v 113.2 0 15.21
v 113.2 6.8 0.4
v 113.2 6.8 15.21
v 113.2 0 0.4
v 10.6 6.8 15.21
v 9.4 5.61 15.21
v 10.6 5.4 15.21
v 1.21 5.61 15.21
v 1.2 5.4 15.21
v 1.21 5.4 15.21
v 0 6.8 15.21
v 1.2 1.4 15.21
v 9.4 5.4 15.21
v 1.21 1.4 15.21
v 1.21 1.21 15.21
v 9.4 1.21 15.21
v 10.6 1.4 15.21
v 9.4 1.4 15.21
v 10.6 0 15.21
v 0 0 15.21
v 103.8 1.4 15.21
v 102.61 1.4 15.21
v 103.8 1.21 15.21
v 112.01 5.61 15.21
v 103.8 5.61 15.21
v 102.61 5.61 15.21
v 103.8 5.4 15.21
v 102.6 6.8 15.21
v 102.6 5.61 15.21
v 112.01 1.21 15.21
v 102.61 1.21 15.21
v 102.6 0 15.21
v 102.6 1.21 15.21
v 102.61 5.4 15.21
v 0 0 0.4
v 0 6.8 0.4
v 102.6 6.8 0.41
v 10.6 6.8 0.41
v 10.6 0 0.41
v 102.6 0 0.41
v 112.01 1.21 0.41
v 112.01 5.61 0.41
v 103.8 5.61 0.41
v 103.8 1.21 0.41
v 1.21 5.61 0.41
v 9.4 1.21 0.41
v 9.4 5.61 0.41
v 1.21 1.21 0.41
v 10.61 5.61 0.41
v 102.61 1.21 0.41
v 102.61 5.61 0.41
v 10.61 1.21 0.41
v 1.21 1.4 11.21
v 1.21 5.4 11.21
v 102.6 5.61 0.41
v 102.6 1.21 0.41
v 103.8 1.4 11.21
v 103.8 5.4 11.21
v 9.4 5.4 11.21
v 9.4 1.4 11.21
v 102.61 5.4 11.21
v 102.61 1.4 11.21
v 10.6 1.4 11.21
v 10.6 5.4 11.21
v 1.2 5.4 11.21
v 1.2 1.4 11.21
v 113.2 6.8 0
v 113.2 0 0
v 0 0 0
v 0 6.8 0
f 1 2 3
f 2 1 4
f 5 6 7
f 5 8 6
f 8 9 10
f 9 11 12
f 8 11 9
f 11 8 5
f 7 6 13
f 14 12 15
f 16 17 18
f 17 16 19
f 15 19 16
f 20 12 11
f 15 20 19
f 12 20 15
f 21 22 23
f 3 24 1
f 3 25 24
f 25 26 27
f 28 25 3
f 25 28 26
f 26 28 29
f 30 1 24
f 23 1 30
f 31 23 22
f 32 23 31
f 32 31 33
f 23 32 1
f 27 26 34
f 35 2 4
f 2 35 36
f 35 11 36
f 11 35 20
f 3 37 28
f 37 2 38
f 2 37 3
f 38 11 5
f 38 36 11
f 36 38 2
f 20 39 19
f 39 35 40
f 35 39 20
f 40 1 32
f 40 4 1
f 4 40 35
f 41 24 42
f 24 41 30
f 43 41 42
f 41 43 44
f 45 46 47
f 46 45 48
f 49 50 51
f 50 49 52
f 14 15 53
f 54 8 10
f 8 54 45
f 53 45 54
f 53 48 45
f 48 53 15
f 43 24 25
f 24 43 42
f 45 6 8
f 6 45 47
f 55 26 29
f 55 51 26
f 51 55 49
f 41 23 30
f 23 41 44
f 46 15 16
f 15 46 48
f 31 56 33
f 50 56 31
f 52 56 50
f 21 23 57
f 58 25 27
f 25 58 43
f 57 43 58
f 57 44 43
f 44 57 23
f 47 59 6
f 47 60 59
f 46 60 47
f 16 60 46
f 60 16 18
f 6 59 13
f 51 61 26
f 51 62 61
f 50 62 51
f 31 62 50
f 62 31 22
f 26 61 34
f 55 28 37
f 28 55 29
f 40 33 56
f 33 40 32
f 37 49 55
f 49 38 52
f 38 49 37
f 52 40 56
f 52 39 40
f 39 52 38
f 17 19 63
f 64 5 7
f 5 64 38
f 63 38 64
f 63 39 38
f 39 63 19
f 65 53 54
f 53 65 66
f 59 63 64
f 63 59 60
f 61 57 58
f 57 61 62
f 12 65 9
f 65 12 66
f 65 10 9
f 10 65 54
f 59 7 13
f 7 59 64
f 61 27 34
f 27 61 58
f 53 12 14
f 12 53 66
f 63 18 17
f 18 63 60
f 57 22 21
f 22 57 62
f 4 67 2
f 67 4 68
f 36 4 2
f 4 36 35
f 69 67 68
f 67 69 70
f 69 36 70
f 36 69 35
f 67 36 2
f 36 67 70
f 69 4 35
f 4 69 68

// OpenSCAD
// file: ../../Base/Rotation.scad
// Fischertechnik Box Foundation
// Geometry Helpers Rotation

include <PlacementOptions.scad>

// getRotatedSpace(space, rotation=NoRotation)
// Rotates the space dependent on the specified rotation

function getRotatedSpace(space, rotation=NoRotation) = [
    (rotation == Rotate90 || rotation == Rotate270) ? space.y : space.x,
    (rotation == Rotate90 || rotation == Rotate270) ? space.x : space.y
];

// Rotates the given space around the fixed left lower corner
// space = the space the children needs as width/depth list [width,depth]
// rotation = 0 Rotate0 degrees, 1 Rotate90 degrees, 2 Rotate180 degrees, 3 Rotate270 degrees (equivalent to -90)

module RotateFix(space, rotation=NoRotation) {
    dy = (rotation == Rotate0 || rotation == Rotate270) ? 0 :
        (rotation == Rotate90) ? space.x :
        space.y;
    dx = (rotation < Rotate180) ? 0 :
        (rotation == Rotate180) ? space.x :
        space.y;
    
    translate([dx, dy, 0])
        rotate([0, 0, rotations[rotation]])
            children();
}
// file: ../../Base/Alignment.scad
// Fischertechnik Box Foundation
// Geometry Helpers Alignment

include <PlacementOptions.scad>

// getAlignedX(elementWidth, spaceWidth, align=AlignRight, offset=0)
// Gets the aligned X offset of an element with the given
// width in the given space.
// elementWidth = The width of the element to positon
// spaceWidth = The space where the element should be aligned
// align = 0 AlignLeft, 1 AlignCenter, 2 AlignRight
// offset = an optional offset from the aligned position. When
// aligned left or centered, then positive values are in X direction.
// When aligned right then positive values are in negative X direction.

function getAlignedX(elementWidth, spaceWidth, align=AlignRight, offset=0) =
    (align == AlignLeft) ?
        offset :
        ((align == AlignCenter) ?
        (spaceWidth - elementWidth)/2 + offset :
        spaceWidth - offset - elementWidth);

// getAlignedY(elementDepth, spaceDepth, align=AlignTop, offset=0)
// Gets the aligned Y offset of an element with the given
// depth in the given space.
// elementDepth = The depth of the element to positon
// spaceDepth = The space where the element should be aligned
// align = 0 AlignBottom, 1 AlignCenter, 2 AlignTop
// offset = an optional offset from the aligned position. When
// aligned bottom or centered, then positive values are in Y direction.
// When aligned top then positive values are in negative Y direction.

function getAlignedY(elementDepth, spaceDepth, align=AlignTop, offset=0) =
    (align == AlignBottom) ?
        offset :
        ((align == AlignCenter) ?
        (spaceDepth - elementDepth)/2 + offset :
        spaceDepth - offset - elementDepth);
// file: ../../Base/Boxes.scad
// Fischertechnik Box Foundation
// Pre-designed Boxes

use <Constants.scad>

include <PlacementOptions.scad>

box190Width = 190;
box190Depth = 130;
box130Width = 130;
box130Depth = 95;

// Values are from an original ec3 box
topBottomDifference = 1.5;
outerHeight = 40;
innerHeight = 38.2;
baseThickness = outerHeight - innerHeight;
stackExcess = 5.7;
radius = 3.5;
wallThickness = 1.5;
tolerance = 0.2;
stackOffset = innerHeight - stackExcess;

boxUsageHeight = stackOffset;
boxWallThickness = wallThickness;
boxBaseThickness = baseThickness;
boxWebWidth = 3.0;

// getBoxWallThickness()
// Gets the wall thickness of a Fischertechnik Box
function getBoxWallThickness() = boxWallThickness;

// getBoxUsageHeight()
// Gets the usable height of a Fischertechnik box
function getBoxUsageHeight() = boxUsageHeight;

// getBoxInnerHeight()
// Gets the inner height of a Fischertechnik box, including the stack excess
function getBoxInnerHeight() = innerHeight;

// getBoxBaseThickness()
// Gets the thickness of the Fischertechnik box base.
function getBoxBaseThickness() = boxBaseThickness;

// getBoxWebWidth()
// Gets the width of a box web
function getBoxWebWidth() = boxWebWidth;

// getBox190Space()
// Gets the usable inner space of a Box 190 as an x/y-list
function getBox190Space() = [
    box190Width - 2*getBoxWallThickness() - topBottomDifference, 
    box190Depth - 2*getBoxWallThickness() - topBottomDifference ];

// BoxBase(width, depth)
// Creates an empty stackable Fischertechnik compatible box
// width = Outer width of the box (190, 130, ...)
// depth = Outer depth of the box (130, 95, ...)

module BoxBase(width, depth, height=outerHeight) {    
    thinPlate = 0.01;

    innerHeight = height - baseThickness;    
    
    module BodyPlate(width, depth) {
        translate([radius, radius])
        hull() {
            w = width-2*radius;
            d = depth-2*radius;
            cube([w, d, thinPlate]);
            cylinder(thinPlate, r=radius, $fn=getFragments());
            translate([w, 0])
                cylinder(thinPlate, r=radius, $fn=getFragments());
            translate([w, d])
                cylinder(thinPlate, r=radius, $fn=getFragments());
            translate([0, d])
                cylinder(thinPlate, r=radius, $fn=getFragments());
        }
    }
    
    module Body(tolerance=tolerance) {
        hull() {
            // Bottom with tolerance to fit into the original boxes when stacked
            translate([-wallThickness+tolerance, -wallThickness+tolerance, -baseThickness])
                BodyPlate(width-topBottomDifference-2*tolerance, depth-topBottomDifference-2*tolerance);
            
            // Top
            translate([-wallThickness-topBottomDifference/2, -wallThickness-topBottomDifference/2, innerHeight-thinPlate])
                BodyPlate(width, depth);
         }
    }

    module Cutoff() {
        hull() {
            coWidth = width - 2*wallThickness;
            coDepth = depth - 2*wallThickness;
            
            // Bottom
            BodyPlate(coWidth-topBottomDifference, coDepth-topBottomDifference);

            // Top
            translate([-topBottomDifference/2, -topBottomDifference/2, innerHeight+thinPlate]) 
                BodyPlate(coWidth, coDepth);
        }
    }
    
    difference() {        
        Body();
        Cutoff();
        stackOffset = innerHeight - stackExcess;
        translate([0, 0, stackOffset + baseThickness])
            Body(tolerance=0);
    }
}

// Creates the Fischertechnik empty box 130x190 mm and places it at position 0,0
// 190x130 are the outer sizes, the inner space is slightly smaller. Use getBox190Space() to get the inner sizes.
// The box is positioned that the usable inner space is at the 0,0,0 position. The

module Box190() {
    BoxBase(box190Width, box190Depth);
}

// Gets the usable inner space of a Box 130 as an x/y-list
function getBox130Space() = [
    box130Width - 2*getBoxWallThickness() - topBottomDifference, 
    box130Depth - 2*getBoxWallThickness() - topBottomDifference ];

// Creates the Fischertechnik empty box 95x130 mm and places it at position 0,0
// 190x130 are the outer sizes, the inner space is slightly smaller. Use getBox190Space() to get the inner sizes.
// The box is positioned that the usable inner space is at the 0,0,0 position. The

module Box130() {
    BoxBase(box130Width, box130Depth);
}

// Creates a web at the specified box walls
// corner 0 = LowerLeft, 1 = UpperLeft, 2 = UpperRight, 3 = LowerRight
// side 0 = LeftOfCorner, 1 = RightOfCorner
// distance = Distance in mm from the corner
// boxSpace = inner width and depth of the box (default: Box 190)
// webWidth = length of the web (default is 3 mms)
// webThickness = thickness of the web (default is 1 mm)

module BoxWeb(corner, side, distance, boxSpace=getBox190Space(), webWidth=getBoxWebWidth(), webThickness=1.0) {
    sink = getBoxWallThickness()/2;

    width = (corner % 2 == 0) ? 
            (side == LeftOfCorner ? webWidth : webThickness) :
            (side == LeftOfCorner ? webThickness : webWidth);

    depth = (corner % 2 == 0) ? 
            (side == RightOfCorner ? webWidth : webThickness) :
            (side == RightOfCorner ? webThickness : webWidth);
    
    xDiff = corner == LowerLeft ? 
                (side == LeftOfCorner ? -sink : distance) :
            (corner == UpperLeft ?                
                (side == LeftOfCorner ? distance : -sink) :
            (corner == UpperRight ?
                (side == LeftOfCorner ? boxSpace.x-webWidth+sink : boxSpace.x-distance-webThickness) :
                (side == LeftOfCorner ? boxSpace.x-distance-webThickness: boxSpace.x-webWidth+sink)));

    yDiff = corner == LowerLeft ? 
                (side == RightOfCorner ? -sink : distance) :
            (corner == UpperLeft ?
                (side == RightOfCorner ? boxSpace.y-distance : boxSpace.y-webWidth+sink) :
            (corner == UpperRight ?
                (side == RightOfCorner ? boxSpace.y-webWidth+sink : boxSpace.y-distance) :
                (side == RightOfCorner ? distance : -sink)));
    
    translate([xDiff, yDiff, -getExcess()])
        cube([width, depth, boxUsageHeight + 2*getExcess()]);
}
// file: ../../Base/PlacementOptions.scad
// Fischertechnik Box Foundation
// Placement Options

// Alignment
NoAlign = 0;
AlignLeft = 1;
AlignBottom = 2;
AlignCenter = 3;
AlignRight = 4;
AlignTop = 5;

// Element rotation degree steps
rotations = [0, -90, -180, -270];

// Rotation
NoRotation = 0;
Rotate0 = 0;
Rotate90 = 1;
Rotate180 = 2;
Rotate270 = 3;

// Docking (seen from above)
NoDock = -1;
DockLeft = 0;
DockTop = 1;
DockRight = 2;
DockCorner = 2;
DockBottom = 3;

// Web corners
LowerLeft = 0;
UpperLeft = 1;
UpperRight = 2;
LowerRight = 3;

// Web position relative to corner
LeftOfCorner = 0;
RightOfCorner = 1;
// file: ../../Base/Placement.scad
// Fischertechnik Box Foundation
// Geometry Helpers Placement

use <Constants.scad>
use <Alignment.scad>
use <Rotation.scad>
use <Boxes.scad>

include <PlacementOptions.scad>

// Place(x=0, y=0, elementSpace=[0,0], alignX=AlignLeft, alignY=AlignBottom, rotation=Rotate0, boxSpace=getBox190Space())
// Places the child at the specified position
// y = Y-Position. This is a relative position when an X aligment is specified.
// x = X-Position. This is a relative position when an Y aligment is specified.
// elementSpace = space of the element to be placed [x,y]
// alignX = -1=NoAlign, 0 AlignLeft, 1 AlignCenter, 3 AlignRight (elementSpace and boxSpace required!)
// alignY = -1=NoAlign, 2 AlignBottom, 1 AlignCenter, 4 AlignTop (elementSpace and boxSpace required!)
// rotation = 0 Rotate0 0 degrees, 1 Rotate90 90 degrees, 
// 2 Rotate180 180 degrees, 3 Rotate270 270 degrees (equivalent to -90)
// boxSpace = Inner space of the box where the placement occurs [x,y] - default is Box 190x130 inner space

module Place(x=0, y=0, elementSpace=[0,0], 
  alignX=AlignLeft, alignY=AlignBottom, 
  rotation=NoRotation, boxSpace=getBox190Space()) {

    module Position(x, y, space, rotation=Rotate0) {
        translate([x, y, 0])
            RotateFix(space, rotation)
                children();
    }

    space = getRotatedSpace(elementSpace, rotation);
    alignedX = getAlignedX(space.x, boxSpace.x, alignX, x);
    alignedY = getAlignedY(space.y, boxSpace.y, alignY, y);
    Position(alignedX, alignedY, elementSpace, rotation)
        children();
}

// Center(space=getBox130Space(), elementSpace=[0,0])
// space = Space where the children is centered. For cylinder use centered=true and no elementSpace.
// elementSpace = space of the element to be centered [x,y]

module Center(space=getBox190Space(), elementSpace=[0,0]) {
    Place(elementSpace=elementSpace, boxSpace=space, alignX=AlignCenter, alignY=AlignCenter)
        children();
}

// CenterHorizontal(width=0, y=0, offset=0, space=getBox130Space())
// width = Width of the element to be placed.
// y = Y position of the element
// offset = Offset from the center position (negative will be left of the center)
// space = Space where the element is placed

module CenterHorizontal(width=0, y=0, offset=0, space=getBox190Space()) {
    Place(x=offset, y=y, elementSpace=[width, 0], boxSpace=space, alignX=AlignCenter)
        children(0);
}

// CenterVertical(depth=0, x=0, offset=0, space=getBox130Space())
// depth = Depth of the element to be placed.
// x = X position of the element
// offset = Offset from the center position (negative will be down of the center)
// space = Space where the element is placed

module CenterVertical(depth=0, x=0, offset=0, space=getBox190Space()) {
    Place(x=x, y=offset, elementSpace=[0, depth], boxSpace=space, alignY=AlignCenter)
        children(0);
}

// getIsVertical(align)
// True if the specified alignment needs a vertical orientation for a divider (AlignRight, AlignLeft)

function getIsVertical(align) = (align == AlignRight || align == AlignLeft);

// getIsHorizontal(align)
// True if the specified alignment needs a horizontal orientation for a divider (AlignTop, AlignBottom)

function getIsHorizontal(align) = (align == AlignTop || align == AlignBottom);
// file: ../../Elements/AxisClip10.scad
// Fischertechnik Box Library
// Axis for clip 10
// 31023

use <../ModelBase/Simple.scad>
use <../Base/Constants.scad>

width = 12;
depth = 12;
height = 23;
upperDiameter = 3.6;
clipHeight = 10;

// getAxisClip10Space()
// Gets the space of a frame for a clip 10 with spring ring (mot2)

function getAxisClip10Space() = [width, depth, height];

// AxisClip10(height, clipHeight)
// Axis for clip 10 with spring ring (mot2)
// height = Height of the complete axis
// clipHeight = Height of the rt for the clip (standard is 10, in mot3 its only 7)

module AxisClip10(height=height, clipHeight=clipHeight) {
    LeveledAxisWithSpace(height, height-clipHeight, getAxisClip10Space(), diameter=upperDiameter);
}

// Tests
color("lightgray")
AxisClip10();
// file: ../../Base/Constants.scad
// Fischertechnik Box Foundation
// Constants

// Constant values necessary for multiple elements

// Base constants
dividerThickness = 1.2;
excess = 0.01;
fragments = 90;
tolerance = 0.8;

// Gets the thickness of a divider 
function getDividerThickness() = dividerThickness;

// Gets the excess that is used to merge walls into each other
function getExcess() = excess;

// Gets amount of fragments of a cylinder
function getFragments() = fragments;

// Gets the inner tolerance of a frame to each side
function getTolerance() = tolerance;


// Fischertechnik specific constants
axisDiameter = 4;
axisBottomDiameter = axisDiameter + 1;
standardEdgeDistance = 2.5;
standardWebDistance = 11.5;
standardCornerLength = 15;
tubeWallFactor = 0.8;
smallPartsFrameHeight = 20;

// Gets axis diameter
function getAxisDiameter() = axisDiameter;

// Gets axis bottom diameter for thicker part at the bottom
function getAxisBottomDiameter() = axisBottomDiameter;

// gets the standard distance to the wall of the box for dockable frames with webs
function getStandardEdgeDistance() = standardEdgeDistance;

// gets the standard distance of each web to the corner of the dockable frame
function getStandardWebDistance() = standardWebDistance;

// gets the standard length of the corner walls of a dockable frame
function getStandardCornerLength() = standardCornerLength;

// gets the wall thickness of a tube.
function getTubeWallThickness() = tubeWallFactor * getDividerThickness();

// gets the frame height for docked small parts boxes.
function getSmallPartsFrameHeight() = smallPartsFrameHeight;
// file: ../../Elements/FrameAxis110.scad
// Fischertechnik Box Library
// Frame for single 110 mm Axis
// 31031

use <../ModelBase/Complex.scad>

length = 110;

// getFrameAxis110Space()
// Gets the width (.x) and depth (.y) of the axis frame.

function getFrameAxis110Space() = getFrameAxisSpace(length);

// FrameAxis110()
// Axis holder for a single 110 mm axis.

module FrameAxis110() {
    FrameAxis(length);
}

// Test
color("lightgray")
FrameAxis110();
// file: ../TestPrint.scad
// 3D Print Test Base

use <../Base/Constants.scad>

use <../Elements/AxisClip10.scad>

module TestPrint(elementSpace) {
    cube([elementSpace.x, elementSpace.y, 0.4]);
    translate([0,0,0.4+getExcess()]) {
        children();
    }
}

TestPrint(getAxisClip10Space())
    AxisClip10();
// main file
// 3D Print Test
// FrameAxis110

use <../TestPrint.scad>
use <../../Elements/FrameAxis110.scad>

TestPrint(getFrameAxis110Space())
    FrameAxis110();
